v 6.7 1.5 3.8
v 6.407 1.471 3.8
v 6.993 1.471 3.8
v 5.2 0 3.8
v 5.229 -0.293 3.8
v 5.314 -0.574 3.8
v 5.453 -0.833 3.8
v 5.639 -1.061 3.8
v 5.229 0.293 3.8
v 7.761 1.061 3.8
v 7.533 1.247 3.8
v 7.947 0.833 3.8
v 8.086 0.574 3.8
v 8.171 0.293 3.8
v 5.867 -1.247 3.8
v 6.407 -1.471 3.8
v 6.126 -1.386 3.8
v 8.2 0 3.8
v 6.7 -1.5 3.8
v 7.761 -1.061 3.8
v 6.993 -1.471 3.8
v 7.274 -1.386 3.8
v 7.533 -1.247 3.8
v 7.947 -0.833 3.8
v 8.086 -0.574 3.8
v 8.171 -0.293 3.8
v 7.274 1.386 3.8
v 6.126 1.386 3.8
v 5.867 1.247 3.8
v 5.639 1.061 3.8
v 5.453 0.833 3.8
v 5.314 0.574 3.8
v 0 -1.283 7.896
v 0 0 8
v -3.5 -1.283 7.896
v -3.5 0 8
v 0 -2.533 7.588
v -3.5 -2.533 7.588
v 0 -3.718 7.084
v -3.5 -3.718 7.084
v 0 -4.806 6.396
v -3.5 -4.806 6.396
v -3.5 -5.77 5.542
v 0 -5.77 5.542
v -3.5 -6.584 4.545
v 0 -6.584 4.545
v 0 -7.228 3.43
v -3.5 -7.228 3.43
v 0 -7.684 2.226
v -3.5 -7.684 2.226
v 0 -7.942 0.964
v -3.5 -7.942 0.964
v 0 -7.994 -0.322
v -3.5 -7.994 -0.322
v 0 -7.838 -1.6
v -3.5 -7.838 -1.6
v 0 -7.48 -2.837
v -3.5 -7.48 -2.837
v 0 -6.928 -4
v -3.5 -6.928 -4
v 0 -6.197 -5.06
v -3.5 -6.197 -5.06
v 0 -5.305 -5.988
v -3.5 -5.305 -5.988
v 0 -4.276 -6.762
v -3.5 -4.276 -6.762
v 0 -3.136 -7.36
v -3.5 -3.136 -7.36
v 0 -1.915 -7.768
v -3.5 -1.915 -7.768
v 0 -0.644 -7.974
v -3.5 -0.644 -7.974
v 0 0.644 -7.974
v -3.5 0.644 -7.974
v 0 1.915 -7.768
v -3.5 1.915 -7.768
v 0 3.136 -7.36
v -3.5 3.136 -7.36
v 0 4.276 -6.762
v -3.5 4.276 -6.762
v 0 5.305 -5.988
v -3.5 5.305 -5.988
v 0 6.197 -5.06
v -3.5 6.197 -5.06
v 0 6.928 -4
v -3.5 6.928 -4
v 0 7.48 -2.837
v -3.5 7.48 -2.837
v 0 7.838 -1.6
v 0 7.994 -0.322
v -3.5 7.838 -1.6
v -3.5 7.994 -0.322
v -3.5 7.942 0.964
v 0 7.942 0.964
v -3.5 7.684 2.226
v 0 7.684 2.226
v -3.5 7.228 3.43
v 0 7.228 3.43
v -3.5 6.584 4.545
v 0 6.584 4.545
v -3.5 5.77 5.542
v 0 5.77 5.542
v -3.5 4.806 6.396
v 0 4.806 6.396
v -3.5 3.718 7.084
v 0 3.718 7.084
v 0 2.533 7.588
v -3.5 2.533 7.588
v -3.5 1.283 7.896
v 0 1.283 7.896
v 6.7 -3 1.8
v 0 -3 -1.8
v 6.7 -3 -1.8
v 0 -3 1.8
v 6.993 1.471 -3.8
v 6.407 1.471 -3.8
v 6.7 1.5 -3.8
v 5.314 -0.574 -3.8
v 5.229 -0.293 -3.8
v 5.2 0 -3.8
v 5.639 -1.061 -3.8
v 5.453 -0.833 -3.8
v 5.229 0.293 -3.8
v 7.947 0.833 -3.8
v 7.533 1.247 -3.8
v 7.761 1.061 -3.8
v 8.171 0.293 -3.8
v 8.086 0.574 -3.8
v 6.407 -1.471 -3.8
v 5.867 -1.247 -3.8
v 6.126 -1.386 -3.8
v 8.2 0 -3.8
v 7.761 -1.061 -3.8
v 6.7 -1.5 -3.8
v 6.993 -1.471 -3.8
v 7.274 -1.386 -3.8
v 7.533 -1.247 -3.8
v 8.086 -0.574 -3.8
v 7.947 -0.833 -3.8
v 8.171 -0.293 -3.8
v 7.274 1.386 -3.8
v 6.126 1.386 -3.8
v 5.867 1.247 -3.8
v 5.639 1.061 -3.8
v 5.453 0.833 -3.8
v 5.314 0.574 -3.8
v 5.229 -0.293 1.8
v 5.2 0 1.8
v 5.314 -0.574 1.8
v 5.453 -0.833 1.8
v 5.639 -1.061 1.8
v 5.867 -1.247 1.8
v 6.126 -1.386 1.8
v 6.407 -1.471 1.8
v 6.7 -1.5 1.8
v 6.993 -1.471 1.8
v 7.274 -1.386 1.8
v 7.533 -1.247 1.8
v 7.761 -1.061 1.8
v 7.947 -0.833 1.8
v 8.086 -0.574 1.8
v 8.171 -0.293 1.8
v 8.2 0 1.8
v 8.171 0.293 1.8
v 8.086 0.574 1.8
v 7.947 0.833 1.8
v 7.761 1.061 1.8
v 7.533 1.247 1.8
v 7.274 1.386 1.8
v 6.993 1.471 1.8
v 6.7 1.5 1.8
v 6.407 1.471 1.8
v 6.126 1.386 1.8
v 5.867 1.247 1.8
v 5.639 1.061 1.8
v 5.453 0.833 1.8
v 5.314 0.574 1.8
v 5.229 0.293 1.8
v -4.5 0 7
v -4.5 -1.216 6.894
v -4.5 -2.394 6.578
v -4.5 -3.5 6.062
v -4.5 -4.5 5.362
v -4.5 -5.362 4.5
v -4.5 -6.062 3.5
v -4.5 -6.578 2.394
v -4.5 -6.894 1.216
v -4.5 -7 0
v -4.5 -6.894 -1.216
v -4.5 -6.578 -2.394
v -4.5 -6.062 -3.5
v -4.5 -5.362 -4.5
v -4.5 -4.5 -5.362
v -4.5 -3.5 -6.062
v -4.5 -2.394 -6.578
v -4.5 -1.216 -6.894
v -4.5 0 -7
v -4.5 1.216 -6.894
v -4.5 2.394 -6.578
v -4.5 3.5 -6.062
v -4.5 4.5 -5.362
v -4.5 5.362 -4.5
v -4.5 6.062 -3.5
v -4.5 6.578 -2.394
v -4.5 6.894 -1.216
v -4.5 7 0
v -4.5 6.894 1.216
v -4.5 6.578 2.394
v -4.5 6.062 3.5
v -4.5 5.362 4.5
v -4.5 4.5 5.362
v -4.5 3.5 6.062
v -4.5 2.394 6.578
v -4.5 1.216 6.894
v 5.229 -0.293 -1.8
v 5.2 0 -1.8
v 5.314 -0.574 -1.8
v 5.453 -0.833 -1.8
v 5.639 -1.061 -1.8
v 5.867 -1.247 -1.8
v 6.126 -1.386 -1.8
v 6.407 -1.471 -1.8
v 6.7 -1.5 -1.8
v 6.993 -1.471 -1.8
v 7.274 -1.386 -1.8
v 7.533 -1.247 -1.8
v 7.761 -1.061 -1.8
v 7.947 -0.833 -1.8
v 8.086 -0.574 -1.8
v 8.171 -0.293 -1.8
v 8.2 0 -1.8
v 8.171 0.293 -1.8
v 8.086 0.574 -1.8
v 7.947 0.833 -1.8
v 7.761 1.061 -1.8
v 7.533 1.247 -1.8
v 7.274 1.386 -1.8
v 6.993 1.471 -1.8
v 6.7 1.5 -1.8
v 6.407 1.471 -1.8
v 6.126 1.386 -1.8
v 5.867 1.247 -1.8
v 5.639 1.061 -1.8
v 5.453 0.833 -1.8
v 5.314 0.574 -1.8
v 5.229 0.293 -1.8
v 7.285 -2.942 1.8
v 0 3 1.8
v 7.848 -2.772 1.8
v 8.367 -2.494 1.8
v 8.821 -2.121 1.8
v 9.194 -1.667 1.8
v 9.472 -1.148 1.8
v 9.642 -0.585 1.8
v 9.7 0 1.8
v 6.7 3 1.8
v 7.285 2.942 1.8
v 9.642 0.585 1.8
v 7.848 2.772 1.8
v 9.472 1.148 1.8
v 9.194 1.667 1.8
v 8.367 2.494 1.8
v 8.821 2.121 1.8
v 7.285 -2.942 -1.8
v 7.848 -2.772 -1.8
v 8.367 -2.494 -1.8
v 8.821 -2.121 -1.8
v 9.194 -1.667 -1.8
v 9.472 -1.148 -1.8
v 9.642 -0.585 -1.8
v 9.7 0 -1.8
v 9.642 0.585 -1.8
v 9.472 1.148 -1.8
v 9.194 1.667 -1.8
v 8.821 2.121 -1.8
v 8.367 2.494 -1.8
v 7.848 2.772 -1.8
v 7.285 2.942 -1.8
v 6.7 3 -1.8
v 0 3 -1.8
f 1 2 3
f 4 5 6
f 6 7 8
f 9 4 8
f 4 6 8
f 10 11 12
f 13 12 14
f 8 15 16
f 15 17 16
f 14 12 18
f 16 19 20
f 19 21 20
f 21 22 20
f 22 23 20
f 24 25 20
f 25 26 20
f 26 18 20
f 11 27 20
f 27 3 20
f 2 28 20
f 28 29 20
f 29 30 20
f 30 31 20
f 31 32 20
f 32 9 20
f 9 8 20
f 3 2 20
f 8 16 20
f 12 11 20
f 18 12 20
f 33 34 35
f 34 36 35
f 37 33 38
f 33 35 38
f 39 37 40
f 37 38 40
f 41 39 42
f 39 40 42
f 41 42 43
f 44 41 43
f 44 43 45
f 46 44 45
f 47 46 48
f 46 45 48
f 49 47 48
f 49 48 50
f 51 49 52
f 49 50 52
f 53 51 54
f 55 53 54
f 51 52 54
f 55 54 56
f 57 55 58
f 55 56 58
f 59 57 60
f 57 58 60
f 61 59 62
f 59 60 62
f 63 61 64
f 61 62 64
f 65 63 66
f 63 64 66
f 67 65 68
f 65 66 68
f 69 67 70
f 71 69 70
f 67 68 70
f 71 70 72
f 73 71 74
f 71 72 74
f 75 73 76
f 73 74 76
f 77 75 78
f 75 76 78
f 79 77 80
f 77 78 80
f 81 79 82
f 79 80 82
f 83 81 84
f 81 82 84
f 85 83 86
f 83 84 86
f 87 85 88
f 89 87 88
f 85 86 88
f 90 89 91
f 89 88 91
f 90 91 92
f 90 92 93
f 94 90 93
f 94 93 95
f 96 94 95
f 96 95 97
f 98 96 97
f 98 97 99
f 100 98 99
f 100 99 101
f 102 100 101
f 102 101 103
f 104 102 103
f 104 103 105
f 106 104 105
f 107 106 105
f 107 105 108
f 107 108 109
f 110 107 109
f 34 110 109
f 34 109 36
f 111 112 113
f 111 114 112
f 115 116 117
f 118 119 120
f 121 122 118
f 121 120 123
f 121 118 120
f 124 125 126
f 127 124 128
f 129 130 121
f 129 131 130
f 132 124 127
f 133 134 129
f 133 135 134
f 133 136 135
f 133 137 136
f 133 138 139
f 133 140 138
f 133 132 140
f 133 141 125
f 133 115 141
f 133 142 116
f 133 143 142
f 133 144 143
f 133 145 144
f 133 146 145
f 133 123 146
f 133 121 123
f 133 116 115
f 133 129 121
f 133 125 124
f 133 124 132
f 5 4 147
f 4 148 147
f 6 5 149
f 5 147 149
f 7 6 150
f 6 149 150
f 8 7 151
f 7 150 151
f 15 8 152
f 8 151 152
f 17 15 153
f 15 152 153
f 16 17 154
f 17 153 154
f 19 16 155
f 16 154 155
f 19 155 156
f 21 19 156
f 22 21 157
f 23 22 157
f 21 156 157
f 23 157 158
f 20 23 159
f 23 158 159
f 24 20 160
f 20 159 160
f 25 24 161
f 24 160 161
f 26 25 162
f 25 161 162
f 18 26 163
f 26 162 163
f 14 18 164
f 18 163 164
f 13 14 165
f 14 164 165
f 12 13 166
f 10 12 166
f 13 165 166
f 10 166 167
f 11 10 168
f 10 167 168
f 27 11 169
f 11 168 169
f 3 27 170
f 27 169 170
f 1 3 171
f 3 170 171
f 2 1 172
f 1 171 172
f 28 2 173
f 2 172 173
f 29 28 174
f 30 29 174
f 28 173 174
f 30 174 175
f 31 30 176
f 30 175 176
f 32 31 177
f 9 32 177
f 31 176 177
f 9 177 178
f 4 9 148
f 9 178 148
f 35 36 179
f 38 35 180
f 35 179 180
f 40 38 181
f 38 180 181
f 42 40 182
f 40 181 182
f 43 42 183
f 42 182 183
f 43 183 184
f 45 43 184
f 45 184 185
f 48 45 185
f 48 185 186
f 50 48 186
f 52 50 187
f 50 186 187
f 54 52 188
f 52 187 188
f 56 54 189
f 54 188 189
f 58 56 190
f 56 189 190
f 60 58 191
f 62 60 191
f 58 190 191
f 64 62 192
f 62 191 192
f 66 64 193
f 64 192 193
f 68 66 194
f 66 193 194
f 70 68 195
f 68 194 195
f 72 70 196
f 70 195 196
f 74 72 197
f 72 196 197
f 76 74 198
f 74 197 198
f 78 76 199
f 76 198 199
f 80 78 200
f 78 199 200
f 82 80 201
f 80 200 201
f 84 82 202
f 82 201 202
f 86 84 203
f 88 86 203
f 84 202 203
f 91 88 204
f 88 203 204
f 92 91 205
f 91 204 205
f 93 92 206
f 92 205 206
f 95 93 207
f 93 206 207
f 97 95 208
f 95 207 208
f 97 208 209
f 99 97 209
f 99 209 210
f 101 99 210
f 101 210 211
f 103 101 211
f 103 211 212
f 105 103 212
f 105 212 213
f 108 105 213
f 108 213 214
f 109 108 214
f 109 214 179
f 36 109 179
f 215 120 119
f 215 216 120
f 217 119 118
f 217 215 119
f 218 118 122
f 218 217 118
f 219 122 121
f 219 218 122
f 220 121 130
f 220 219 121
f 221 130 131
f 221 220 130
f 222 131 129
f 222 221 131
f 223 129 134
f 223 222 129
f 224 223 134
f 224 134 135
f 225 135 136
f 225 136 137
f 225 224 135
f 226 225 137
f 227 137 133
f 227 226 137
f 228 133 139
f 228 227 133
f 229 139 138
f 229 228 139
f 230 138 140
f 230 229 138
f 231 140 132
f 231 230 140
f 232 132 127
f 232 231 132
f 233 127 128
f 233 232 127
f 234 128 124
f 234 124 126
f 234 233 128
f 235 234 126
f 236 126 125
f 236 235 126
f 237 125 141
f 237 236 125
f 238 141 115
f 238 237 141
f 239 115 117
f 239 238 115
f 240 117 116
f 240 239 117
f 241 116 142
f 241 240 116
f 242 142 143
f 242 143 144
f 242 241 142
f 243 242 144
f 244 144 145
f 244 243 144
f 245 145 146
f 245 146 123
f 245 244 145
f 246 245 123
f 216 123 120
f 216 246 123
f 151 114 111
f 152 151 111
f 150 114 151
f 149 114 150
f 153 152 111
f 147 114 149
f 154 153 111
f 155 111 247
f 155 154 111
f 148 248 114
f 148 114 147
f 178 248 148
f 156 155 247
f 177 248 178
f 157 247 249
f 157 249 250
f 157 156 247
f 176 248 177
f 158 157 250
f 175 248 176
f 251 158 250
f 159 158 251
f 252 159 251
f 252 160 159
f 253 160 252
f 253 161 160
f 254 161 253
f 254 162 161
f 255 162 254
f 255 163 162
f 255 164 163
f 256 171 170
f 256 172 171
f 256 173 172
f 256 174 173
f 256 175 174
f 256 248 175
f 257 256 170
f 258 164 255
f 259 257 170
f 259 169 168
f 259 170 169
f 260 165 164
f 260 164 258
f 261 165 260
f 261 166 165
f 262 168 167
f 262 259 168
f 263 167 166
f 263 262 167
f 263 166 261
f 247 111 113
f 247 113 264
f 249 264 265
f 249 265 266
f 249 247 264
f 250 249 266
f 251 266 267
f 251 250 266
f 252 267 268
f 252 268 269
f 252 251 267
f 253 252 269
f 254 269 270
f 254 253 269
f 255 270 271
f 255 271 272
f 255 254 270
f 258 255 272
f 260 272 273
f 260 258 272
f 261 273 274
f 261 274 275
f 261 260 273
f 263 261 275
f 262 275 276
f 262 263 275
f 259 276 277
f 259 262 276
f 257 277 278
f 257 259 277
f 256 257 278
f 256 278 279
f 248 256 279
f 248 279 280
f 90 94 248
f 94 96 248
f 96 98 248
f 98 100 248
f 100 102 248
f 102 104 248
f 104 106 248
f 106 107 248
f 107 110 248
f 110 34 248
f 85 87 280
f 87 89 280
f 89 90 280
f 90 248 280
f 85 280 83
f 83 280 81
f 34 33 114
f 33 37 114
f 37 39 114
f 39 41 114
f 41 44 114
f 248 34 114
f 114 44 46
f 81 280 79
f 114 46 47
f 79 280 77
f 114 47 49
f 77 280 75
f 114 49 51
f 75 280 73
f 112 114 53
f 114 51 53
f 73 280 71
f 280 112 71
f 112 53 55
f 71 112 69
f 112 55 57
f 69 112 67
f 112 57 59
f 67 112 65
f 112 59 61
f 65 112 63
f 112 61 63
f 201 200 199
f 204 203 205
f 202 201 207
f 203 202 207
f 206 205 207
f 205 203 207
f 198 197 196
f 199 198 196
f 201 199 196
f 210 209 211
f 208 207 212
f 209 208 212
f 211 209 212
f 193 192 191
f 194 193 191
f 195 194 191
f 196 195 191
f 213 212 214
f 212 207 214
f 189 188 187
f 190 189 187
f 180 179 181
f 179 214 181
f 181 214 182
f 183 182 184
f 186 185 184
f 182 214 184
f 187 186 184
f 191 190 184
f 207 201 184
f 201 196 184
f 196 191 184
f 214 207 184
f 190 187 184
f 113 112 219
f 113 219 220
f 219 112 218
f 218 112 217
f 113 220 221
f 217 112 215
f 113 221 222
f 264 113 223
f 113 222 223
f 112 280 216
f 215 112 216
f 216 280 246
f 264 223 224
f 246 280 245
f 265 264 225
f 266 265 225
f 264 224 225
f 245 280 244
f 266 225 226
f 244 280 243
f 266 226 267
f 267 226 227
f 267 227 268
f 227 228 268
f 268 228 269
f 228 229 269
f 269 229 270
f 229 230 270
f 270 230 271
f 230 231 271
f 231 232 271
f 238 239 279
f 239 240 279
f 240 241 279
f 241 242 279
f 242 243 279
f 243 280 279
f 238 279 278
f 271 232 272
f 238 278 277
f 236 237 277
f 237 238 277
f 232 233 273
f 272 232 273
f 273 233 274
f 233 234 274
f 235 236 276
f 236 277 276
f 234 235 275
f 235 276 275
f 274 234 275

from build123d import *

# Parameters (mm, degrees)
EXTRUDE_1_DEPTH = 1.8
SKETCH_4_W      = 1.5
SKETCH_4_H      = 2


with BuildPart() as part:
    # 草图1 → 旋转1 (revolve)
    with BuildSketch(Plane.XY, mode=Mode.PRIVATE) as revolve_1_sk:
        Polygon((-4.5, 7), (-4.5, 0), (0, 0), (0, 8), (-3.5, 8), align=None)
    revolve(revolve_1_sk.sketch.rotate(Axis((-4.5, 0, 0), (1, 0, 0)), 90), axis=Axis((-4.5, 0, 0), (1, 0, 0)))

    # 草图3 → 凸台-拉伸1 (add, symmetric)
    with BuildSketch(Plane.XY):
        with BuildLine():
            Line((0, -3), (6.7, -3))
            ThreePointArc((6.7, -3), (9.7, 0), (6.7, 3))
            Line((6.7, 3), (0, 3))
            Line((0, 3), (0, -3))
        make_face()
    extrude(amount=EXTRUDE_1_DEPTH, both=True)

    # 草图4 → 旋转2 (revolve)
    with BuildSketch(Plane(origin=(0, 0, 0), x_dir=(1, 0, 0), z_dir=(0, 1, 0)), mode=Mode.PRIVATE) as revolve_2_sk:
        with Locations((7.45, -2.8)):
            Rectangle(SKETCH_4_W, SKETCH_4_H)
    revolve_2 = revolve(revolve_2_sk.sketch.rotate(Axis((6.7, 0, 1.8), (0, 0, 1)), 180), axis=Axis((6.7, 0, 1.8), (0, 0, 1)))

    # 镜向1: 旋转2 across plane
    add(revolve_2.mirror(Plane.XY))


solid = part.part
